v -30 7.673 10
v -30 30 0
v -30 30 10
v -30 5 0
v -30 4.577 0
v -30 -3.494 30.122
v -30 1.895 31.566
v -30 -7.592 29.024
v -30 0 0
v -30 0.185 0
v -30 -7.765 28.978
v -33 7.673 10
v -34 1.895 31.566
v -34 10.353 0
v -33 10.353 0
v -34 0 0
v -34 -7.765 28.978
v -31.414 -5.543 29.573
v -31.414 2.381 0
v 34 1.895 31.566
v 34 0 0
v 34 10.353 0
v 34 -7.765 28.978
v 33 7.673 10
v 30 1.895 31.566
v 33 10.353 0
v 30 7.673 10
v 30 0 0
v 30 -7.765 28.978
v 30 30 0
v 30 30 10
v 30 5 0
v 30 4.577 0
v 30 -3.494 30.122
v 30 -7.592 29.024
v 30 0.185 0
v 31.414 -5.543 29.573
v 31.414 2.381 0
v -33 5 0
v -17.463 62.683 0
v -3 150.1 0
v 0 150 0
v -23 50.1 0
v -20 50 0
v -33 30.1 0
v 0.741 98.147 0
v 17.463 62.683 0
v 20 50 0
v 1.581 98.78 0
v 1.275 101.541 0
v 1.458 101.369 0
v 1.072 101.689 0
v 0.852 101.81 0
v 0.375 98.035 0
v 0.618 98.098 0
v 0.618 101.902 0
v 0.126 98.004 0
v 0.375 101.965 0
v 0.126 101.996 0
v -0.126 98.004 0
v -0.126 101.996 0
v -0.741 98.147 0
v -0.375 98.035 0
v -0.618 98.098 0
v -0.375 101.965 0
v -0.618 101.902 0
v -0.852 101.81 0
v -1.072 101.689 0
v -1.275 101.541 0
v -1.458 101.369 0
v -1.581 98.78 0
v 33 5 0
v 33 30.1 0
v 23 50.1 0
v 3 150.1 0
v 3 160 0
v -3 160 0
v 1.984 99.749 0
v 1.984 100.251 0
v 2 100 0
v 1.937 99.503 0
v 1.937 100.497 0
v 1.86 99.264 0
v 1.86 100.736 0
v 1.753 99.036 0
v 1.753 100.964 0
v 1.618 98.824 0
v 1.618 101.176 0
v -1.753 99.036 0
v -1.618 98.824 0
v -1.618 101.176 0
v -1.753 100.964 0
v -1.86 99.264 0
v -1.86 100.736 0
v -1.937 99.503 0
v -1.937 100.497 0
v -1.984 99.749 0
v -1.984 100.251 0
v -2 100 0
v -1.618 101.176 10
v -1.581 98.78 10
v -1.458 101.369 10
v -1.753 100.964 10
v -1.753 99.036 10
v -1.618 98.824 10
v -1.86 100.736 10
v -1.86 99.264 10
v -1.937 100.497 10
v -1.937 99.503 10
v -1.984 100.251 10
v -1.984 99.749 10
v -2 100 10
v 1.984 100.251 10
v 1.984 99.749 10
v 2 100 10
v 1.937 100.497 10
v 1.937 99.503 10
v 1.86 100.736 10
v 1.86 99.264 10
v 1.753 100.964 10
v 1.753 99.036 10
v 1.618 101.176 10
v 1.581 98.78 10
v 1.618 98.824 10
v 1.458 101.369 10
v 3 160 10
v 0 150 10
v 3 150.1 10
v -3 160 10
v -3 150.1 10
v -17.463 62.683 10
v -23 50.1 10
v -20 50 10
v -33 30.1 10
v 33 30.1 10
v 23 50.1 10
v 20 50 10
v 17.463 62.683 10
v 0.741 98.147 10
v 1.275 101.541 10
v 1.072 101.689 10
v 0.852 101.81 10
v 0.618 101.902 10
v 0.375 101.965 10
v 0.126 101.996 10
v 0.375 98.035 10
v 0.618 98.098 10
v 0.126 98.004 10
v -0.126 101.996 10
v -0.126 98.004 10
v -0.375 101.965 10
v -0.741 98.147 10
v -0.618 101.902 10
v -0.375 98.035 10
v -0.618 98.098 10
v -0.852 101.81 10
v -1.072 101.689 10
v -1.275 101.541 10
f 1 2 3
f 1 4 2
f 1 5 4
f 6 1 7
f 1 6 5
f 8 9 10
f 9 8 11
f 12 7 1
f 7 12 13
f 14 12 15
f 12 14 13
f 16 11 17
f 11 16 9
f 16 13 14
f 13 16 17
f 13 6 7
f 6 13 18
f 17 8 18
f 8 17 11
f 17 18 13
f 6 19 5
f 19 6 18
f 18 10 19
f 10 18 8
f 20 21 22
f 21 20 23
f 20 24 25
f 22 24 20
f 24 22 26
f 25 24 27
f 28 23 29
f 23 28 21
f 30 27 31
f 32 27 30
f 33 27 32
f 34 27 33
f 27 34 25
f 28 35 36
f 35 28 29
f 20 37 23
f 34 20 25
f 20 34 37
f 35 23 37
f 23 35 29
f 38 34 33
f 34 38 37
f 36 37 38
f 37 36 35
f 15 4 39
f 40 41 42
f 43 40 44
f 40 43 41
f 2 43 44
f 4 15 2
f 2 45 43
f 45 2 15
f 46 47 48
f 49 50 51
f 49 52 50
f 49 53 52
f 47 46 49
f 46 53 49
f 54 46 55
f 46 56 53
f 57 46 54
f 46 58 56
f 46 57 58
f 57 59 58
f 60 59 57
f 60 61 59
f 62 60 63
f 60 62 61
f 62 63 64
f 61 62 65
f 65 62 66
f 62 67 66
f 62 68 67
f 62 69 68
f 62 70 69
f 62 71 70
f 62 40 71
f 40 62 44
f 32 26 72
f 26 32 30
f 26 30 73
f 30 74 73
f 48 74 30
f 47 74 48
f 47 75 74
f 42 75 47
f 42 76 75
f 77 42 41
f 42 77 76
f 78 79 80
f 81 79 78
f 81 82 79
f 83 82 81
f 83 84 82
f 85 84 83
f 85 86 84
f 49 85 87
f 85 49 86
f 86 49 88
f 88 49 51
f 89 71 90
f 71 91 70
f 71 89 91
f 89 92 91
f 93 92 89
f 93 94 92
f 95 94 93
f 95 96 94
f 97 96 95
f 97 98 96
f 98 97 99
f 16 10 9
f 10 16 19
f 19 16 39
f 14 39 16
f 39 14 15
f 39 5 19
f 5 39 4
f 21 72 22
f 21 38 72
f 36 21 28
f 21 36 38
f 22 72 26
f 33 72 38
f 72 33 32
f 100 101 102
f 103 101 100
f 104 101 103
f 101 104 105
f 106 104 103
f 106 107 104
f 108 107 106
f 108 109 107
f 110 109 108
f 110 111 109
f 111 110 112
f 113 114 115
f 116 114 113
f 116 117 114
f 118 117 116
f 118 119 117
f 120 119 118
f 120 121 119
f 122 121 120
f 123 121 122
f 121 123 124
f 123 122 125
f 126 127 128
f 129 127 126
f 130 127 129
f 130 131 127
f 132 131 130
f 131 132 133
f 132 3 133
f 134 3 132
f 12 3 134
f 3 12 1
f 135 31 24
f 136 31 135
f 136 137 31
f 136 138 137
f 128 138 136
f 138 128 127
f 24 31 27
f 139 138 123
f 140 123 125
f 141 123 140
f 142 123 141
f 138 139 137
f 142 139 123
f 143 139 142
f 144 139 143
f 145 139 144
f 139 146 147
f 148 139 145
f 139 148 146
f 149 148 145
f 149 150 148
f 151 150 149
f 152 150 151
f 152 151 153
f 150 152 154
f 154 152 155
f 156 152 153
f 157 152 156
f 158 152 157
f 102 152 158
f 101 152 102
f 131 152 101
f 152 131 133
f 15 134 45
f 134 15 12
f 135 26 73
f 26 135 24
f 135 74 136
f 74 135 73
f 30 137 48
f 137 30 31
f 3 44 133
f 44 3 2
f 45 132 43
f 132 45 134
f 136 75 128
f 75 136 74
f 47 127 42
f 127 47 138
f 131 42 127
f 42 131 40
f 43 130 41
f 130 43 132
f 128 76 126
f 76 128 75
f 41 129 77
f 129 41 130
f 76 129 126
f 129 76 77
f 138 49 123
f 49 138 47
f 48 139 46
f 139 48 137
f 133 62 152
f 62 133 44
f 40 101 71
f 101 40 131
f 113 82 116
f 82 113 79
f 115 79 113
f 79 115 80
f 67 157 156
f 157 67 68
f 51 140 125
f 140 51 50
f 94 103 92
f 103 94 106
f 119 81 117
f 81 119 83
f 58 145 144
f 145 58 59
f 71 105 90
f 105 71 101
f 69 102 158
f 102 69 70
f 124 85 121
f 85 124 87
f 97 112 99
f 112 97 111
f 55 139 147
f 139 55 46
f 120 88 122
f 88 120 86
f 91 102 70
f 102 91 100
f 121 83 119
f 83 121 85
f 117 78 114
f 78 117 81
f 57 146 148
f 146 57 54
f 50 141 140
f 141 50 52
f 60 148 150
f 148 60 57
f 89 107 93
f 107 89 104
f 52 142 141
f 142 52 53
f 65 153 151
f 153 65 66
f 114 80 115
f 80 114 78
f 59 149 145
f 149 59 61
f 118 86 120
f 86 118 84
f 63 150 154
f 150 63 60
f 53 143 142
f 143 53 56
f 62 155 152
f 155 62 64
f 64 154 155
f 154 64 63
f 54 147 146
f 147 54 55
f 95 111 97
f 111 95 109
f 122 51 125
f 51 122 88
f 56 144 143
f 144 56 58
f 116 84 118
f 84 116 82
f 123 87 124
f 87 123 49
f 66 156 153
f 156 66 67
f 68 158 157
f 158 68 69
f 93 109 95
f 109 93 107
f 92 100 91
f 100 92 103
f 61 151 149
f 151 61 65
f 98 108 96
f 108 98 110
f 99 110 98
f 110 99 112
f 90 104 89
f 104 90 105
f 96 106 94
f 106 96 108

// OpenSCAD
//height
ph=10; // [6:30] 
//thickness
pt=3; // [1:0.1:5]
//claw length
pl=30; // [10:1:100]
//width (pcb)
pw=60; //[0:1:200]

difference()
{
    union()
    {
        rotate([-75,0,0])
        translate([-pt-(pw/2),-pl,0])
        difference()
        {
            translate([-1,0,0])
            cube([pt+1,2*pl,ph]);
            translate([pt,0,2.3])
            scale([1,1,1.5])
            rotate([0,45,0])
            translate([-1,-1,-1])
            cube([2,2*pl,2]);
        }
        rotate([-75,0,0])
        translate([pw/2,-pl,0])
        difference()
        {
            cube([pt+1,2*pl,ph]);
            translate([0,0,2.3])
            scale([1,1,1.5])
            rotate([0,45,0])
            translate([-1,-1,-1])
            cube([2,2*pl,2]);
        }
    }
    translate([-pw,-pw,-2*pw])
    cube(2*pw);
}

translate([-pt-(pw/2),5,0])
cube([pt,25,ph]);
translate([pw/2,5,0])
cube([pt,25,ph]);

hull()
{
    translate([pw/2,30,0])
    cube([pt,0.1,ph]);
    translate([20,50,0])
    cube([pt,0.1,ph]);
}
hull()
{
    translate([-pt-(pw/2),30,0])
    cube([pt,0.1,ph]);
    translate([-20-pt,50,0])
    cube([pt,0.1,ph]);
}

hull()
{
    translate([20,50,0])
    cube([pt,0.1,ph]);
    translate([0,150,0])
    cube([pt,0.1,ph]);
}
hull()
{
    translate([-20-pt,50,0])
    cube([pt,0.1,ph]);
    translate([-pt,150,0])
    cube([pt,0.1,ph]);
}
translate([-pt,150,0])
cube([2*pt,10,ph]);
hull()
{
    translate([20,50,0])
    cube([pt,0.1,ph]);
    translate([0,100,0])
    cube([1,0.1,ph]);
}
hull()
{
    translate([-20-pt,50,0])
    cube([pt,0.1,ph]);
    translate([-1,100,0])
    cube([1,0.1,ph]);
}
translate([0,100,0])
cylinder(r=2,h=ph,$fn=50);
